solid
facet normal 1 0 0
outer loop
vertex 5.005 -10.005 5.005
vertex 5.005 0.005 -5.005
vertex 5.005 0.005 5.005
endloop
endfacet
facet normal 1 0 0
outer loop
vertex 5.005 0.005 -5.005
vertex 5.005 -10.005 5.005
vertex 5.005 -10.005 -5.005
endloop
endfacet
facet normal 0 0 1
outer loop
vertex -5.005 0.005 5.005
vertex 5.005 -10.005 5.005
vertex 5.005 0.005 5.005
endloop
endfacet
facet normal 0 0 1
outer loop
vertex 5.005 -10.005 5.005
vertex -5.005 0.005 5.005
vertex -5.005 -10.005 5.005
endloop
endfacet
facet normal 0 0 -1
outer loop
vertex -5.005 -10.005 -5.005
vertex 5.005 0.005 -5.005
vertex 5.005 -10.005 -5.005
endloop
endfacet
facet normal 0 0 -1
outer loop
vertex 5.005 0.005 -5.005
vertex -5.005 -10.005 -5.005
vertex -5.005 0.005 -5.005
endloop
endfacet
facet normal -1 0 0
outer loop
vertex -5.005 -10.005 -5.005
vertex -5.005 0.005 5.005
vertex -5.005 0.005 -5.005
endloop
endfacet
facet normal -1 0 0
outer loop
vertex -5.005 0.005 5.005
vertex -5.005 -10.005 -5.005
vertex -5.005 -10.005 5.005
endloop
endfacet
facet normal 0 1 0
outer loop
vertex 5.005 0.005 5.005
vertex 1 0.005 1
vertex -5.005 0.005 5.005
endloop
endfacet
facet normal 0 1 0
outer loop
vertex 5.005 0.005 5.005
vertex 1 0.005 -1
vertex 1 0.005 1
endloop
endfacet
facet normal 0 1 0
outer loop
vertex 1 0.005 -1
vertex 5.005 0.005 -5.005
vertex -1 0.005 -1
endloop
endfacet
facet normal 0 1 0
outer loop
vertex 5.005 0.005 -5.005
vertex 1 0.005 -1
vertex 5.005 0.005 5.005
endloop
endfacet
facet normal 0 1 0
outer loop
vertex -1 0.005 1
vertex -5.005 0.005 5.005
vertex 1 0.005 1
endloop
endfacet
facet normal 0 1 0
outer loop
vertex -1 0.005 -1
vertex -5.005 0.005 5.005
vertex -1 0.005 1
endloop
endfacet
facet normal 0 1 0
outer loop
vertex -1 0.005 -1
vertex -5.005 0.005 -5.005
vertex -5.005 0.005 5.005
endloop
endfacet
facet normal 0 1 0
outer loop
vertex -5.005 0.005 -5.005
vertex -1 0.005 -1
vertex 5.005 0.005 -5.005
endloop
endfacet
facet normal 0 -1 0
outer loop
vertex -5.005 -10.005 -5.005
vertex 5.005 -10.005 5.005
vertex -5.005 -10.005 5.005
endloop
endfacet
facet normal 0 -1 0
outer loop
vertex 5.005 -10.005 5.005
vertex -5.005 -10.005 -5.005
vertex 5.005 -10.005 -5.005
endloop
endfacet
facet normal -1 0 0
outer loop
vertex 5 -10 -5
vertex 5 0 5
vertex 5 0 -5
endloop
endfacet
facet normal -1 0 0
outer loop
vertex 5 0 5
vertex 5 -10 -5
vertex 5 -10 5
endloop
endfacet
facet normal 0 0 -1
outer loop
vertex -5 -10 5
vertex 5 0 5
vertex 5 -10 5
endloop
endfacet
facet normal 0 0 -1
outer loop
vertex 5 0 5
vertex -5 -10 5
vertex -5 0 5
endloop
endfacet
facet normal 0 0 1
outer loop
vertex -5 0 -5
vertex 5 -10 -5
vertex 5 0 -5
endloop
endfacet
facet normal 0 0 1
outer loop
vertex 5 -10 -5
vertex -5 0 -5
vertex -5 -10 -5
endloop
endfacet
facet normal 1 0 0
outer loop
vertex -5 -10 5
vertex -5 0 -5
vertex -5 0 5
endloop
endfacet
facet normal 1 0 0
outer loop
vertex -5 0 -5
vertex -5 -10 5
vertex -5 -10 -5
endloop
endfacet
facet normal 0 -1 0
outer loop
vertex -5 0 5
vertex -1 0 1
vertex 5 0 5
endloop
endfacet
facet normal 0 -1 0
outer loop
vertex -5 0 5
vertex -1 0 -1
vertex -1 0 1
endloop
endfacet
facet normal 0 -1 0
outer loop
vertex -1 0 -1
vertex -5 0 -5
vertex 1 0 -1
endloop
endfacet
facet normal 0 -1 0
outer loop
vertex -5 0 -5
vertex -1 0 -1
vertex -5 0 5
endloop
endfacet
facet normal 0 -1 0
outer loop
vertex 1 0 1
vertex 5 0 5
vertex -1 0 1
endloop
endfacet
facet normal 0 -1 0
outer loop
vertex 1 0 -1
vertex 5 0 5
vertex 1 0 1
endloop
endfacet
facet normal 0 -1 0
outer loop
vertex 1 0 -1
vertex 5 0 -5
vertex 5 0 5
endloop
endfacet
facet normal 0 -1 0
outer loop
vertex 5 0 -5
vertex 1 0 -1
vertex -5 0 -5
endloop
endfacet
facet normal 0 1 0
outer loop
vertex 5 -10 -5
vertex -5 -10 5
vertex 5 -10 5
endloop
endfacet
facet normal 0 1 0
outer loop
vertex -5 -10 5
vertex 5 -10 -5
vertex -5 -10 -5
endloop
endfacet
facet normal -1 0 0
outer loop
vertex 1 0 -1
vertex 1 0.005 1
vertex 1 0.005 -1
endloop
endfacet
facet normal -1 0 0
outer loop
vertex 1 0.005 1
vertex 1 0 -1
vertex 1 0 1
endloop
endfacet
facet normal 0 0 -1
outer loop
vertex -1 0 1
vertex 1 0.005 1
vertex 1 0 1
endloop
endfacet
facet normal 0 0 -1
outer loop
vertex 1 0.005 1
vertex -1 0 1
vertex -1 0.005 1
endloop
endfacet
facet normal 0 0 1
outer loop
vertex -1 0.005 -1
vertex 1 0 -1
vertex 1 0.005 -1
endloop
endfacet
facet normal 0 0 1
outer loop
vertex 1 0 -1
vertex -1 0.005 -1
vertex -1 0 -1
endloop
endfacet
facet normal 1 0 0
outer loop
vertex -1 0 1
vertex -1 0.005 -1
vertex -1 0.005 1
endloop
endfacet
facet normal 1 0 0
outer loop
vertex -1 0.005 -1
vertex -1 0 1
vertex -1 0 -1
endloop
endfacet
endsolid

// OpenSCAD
size=10;
translate([0,-size/2,0])
difference(){
    cube([size+0.01,size+0.01,size+0.01], center=true);
    cube([size,size,size], center=true);
    translate([0,100/2,0])
    cube([2,100,2], center=true);
}
